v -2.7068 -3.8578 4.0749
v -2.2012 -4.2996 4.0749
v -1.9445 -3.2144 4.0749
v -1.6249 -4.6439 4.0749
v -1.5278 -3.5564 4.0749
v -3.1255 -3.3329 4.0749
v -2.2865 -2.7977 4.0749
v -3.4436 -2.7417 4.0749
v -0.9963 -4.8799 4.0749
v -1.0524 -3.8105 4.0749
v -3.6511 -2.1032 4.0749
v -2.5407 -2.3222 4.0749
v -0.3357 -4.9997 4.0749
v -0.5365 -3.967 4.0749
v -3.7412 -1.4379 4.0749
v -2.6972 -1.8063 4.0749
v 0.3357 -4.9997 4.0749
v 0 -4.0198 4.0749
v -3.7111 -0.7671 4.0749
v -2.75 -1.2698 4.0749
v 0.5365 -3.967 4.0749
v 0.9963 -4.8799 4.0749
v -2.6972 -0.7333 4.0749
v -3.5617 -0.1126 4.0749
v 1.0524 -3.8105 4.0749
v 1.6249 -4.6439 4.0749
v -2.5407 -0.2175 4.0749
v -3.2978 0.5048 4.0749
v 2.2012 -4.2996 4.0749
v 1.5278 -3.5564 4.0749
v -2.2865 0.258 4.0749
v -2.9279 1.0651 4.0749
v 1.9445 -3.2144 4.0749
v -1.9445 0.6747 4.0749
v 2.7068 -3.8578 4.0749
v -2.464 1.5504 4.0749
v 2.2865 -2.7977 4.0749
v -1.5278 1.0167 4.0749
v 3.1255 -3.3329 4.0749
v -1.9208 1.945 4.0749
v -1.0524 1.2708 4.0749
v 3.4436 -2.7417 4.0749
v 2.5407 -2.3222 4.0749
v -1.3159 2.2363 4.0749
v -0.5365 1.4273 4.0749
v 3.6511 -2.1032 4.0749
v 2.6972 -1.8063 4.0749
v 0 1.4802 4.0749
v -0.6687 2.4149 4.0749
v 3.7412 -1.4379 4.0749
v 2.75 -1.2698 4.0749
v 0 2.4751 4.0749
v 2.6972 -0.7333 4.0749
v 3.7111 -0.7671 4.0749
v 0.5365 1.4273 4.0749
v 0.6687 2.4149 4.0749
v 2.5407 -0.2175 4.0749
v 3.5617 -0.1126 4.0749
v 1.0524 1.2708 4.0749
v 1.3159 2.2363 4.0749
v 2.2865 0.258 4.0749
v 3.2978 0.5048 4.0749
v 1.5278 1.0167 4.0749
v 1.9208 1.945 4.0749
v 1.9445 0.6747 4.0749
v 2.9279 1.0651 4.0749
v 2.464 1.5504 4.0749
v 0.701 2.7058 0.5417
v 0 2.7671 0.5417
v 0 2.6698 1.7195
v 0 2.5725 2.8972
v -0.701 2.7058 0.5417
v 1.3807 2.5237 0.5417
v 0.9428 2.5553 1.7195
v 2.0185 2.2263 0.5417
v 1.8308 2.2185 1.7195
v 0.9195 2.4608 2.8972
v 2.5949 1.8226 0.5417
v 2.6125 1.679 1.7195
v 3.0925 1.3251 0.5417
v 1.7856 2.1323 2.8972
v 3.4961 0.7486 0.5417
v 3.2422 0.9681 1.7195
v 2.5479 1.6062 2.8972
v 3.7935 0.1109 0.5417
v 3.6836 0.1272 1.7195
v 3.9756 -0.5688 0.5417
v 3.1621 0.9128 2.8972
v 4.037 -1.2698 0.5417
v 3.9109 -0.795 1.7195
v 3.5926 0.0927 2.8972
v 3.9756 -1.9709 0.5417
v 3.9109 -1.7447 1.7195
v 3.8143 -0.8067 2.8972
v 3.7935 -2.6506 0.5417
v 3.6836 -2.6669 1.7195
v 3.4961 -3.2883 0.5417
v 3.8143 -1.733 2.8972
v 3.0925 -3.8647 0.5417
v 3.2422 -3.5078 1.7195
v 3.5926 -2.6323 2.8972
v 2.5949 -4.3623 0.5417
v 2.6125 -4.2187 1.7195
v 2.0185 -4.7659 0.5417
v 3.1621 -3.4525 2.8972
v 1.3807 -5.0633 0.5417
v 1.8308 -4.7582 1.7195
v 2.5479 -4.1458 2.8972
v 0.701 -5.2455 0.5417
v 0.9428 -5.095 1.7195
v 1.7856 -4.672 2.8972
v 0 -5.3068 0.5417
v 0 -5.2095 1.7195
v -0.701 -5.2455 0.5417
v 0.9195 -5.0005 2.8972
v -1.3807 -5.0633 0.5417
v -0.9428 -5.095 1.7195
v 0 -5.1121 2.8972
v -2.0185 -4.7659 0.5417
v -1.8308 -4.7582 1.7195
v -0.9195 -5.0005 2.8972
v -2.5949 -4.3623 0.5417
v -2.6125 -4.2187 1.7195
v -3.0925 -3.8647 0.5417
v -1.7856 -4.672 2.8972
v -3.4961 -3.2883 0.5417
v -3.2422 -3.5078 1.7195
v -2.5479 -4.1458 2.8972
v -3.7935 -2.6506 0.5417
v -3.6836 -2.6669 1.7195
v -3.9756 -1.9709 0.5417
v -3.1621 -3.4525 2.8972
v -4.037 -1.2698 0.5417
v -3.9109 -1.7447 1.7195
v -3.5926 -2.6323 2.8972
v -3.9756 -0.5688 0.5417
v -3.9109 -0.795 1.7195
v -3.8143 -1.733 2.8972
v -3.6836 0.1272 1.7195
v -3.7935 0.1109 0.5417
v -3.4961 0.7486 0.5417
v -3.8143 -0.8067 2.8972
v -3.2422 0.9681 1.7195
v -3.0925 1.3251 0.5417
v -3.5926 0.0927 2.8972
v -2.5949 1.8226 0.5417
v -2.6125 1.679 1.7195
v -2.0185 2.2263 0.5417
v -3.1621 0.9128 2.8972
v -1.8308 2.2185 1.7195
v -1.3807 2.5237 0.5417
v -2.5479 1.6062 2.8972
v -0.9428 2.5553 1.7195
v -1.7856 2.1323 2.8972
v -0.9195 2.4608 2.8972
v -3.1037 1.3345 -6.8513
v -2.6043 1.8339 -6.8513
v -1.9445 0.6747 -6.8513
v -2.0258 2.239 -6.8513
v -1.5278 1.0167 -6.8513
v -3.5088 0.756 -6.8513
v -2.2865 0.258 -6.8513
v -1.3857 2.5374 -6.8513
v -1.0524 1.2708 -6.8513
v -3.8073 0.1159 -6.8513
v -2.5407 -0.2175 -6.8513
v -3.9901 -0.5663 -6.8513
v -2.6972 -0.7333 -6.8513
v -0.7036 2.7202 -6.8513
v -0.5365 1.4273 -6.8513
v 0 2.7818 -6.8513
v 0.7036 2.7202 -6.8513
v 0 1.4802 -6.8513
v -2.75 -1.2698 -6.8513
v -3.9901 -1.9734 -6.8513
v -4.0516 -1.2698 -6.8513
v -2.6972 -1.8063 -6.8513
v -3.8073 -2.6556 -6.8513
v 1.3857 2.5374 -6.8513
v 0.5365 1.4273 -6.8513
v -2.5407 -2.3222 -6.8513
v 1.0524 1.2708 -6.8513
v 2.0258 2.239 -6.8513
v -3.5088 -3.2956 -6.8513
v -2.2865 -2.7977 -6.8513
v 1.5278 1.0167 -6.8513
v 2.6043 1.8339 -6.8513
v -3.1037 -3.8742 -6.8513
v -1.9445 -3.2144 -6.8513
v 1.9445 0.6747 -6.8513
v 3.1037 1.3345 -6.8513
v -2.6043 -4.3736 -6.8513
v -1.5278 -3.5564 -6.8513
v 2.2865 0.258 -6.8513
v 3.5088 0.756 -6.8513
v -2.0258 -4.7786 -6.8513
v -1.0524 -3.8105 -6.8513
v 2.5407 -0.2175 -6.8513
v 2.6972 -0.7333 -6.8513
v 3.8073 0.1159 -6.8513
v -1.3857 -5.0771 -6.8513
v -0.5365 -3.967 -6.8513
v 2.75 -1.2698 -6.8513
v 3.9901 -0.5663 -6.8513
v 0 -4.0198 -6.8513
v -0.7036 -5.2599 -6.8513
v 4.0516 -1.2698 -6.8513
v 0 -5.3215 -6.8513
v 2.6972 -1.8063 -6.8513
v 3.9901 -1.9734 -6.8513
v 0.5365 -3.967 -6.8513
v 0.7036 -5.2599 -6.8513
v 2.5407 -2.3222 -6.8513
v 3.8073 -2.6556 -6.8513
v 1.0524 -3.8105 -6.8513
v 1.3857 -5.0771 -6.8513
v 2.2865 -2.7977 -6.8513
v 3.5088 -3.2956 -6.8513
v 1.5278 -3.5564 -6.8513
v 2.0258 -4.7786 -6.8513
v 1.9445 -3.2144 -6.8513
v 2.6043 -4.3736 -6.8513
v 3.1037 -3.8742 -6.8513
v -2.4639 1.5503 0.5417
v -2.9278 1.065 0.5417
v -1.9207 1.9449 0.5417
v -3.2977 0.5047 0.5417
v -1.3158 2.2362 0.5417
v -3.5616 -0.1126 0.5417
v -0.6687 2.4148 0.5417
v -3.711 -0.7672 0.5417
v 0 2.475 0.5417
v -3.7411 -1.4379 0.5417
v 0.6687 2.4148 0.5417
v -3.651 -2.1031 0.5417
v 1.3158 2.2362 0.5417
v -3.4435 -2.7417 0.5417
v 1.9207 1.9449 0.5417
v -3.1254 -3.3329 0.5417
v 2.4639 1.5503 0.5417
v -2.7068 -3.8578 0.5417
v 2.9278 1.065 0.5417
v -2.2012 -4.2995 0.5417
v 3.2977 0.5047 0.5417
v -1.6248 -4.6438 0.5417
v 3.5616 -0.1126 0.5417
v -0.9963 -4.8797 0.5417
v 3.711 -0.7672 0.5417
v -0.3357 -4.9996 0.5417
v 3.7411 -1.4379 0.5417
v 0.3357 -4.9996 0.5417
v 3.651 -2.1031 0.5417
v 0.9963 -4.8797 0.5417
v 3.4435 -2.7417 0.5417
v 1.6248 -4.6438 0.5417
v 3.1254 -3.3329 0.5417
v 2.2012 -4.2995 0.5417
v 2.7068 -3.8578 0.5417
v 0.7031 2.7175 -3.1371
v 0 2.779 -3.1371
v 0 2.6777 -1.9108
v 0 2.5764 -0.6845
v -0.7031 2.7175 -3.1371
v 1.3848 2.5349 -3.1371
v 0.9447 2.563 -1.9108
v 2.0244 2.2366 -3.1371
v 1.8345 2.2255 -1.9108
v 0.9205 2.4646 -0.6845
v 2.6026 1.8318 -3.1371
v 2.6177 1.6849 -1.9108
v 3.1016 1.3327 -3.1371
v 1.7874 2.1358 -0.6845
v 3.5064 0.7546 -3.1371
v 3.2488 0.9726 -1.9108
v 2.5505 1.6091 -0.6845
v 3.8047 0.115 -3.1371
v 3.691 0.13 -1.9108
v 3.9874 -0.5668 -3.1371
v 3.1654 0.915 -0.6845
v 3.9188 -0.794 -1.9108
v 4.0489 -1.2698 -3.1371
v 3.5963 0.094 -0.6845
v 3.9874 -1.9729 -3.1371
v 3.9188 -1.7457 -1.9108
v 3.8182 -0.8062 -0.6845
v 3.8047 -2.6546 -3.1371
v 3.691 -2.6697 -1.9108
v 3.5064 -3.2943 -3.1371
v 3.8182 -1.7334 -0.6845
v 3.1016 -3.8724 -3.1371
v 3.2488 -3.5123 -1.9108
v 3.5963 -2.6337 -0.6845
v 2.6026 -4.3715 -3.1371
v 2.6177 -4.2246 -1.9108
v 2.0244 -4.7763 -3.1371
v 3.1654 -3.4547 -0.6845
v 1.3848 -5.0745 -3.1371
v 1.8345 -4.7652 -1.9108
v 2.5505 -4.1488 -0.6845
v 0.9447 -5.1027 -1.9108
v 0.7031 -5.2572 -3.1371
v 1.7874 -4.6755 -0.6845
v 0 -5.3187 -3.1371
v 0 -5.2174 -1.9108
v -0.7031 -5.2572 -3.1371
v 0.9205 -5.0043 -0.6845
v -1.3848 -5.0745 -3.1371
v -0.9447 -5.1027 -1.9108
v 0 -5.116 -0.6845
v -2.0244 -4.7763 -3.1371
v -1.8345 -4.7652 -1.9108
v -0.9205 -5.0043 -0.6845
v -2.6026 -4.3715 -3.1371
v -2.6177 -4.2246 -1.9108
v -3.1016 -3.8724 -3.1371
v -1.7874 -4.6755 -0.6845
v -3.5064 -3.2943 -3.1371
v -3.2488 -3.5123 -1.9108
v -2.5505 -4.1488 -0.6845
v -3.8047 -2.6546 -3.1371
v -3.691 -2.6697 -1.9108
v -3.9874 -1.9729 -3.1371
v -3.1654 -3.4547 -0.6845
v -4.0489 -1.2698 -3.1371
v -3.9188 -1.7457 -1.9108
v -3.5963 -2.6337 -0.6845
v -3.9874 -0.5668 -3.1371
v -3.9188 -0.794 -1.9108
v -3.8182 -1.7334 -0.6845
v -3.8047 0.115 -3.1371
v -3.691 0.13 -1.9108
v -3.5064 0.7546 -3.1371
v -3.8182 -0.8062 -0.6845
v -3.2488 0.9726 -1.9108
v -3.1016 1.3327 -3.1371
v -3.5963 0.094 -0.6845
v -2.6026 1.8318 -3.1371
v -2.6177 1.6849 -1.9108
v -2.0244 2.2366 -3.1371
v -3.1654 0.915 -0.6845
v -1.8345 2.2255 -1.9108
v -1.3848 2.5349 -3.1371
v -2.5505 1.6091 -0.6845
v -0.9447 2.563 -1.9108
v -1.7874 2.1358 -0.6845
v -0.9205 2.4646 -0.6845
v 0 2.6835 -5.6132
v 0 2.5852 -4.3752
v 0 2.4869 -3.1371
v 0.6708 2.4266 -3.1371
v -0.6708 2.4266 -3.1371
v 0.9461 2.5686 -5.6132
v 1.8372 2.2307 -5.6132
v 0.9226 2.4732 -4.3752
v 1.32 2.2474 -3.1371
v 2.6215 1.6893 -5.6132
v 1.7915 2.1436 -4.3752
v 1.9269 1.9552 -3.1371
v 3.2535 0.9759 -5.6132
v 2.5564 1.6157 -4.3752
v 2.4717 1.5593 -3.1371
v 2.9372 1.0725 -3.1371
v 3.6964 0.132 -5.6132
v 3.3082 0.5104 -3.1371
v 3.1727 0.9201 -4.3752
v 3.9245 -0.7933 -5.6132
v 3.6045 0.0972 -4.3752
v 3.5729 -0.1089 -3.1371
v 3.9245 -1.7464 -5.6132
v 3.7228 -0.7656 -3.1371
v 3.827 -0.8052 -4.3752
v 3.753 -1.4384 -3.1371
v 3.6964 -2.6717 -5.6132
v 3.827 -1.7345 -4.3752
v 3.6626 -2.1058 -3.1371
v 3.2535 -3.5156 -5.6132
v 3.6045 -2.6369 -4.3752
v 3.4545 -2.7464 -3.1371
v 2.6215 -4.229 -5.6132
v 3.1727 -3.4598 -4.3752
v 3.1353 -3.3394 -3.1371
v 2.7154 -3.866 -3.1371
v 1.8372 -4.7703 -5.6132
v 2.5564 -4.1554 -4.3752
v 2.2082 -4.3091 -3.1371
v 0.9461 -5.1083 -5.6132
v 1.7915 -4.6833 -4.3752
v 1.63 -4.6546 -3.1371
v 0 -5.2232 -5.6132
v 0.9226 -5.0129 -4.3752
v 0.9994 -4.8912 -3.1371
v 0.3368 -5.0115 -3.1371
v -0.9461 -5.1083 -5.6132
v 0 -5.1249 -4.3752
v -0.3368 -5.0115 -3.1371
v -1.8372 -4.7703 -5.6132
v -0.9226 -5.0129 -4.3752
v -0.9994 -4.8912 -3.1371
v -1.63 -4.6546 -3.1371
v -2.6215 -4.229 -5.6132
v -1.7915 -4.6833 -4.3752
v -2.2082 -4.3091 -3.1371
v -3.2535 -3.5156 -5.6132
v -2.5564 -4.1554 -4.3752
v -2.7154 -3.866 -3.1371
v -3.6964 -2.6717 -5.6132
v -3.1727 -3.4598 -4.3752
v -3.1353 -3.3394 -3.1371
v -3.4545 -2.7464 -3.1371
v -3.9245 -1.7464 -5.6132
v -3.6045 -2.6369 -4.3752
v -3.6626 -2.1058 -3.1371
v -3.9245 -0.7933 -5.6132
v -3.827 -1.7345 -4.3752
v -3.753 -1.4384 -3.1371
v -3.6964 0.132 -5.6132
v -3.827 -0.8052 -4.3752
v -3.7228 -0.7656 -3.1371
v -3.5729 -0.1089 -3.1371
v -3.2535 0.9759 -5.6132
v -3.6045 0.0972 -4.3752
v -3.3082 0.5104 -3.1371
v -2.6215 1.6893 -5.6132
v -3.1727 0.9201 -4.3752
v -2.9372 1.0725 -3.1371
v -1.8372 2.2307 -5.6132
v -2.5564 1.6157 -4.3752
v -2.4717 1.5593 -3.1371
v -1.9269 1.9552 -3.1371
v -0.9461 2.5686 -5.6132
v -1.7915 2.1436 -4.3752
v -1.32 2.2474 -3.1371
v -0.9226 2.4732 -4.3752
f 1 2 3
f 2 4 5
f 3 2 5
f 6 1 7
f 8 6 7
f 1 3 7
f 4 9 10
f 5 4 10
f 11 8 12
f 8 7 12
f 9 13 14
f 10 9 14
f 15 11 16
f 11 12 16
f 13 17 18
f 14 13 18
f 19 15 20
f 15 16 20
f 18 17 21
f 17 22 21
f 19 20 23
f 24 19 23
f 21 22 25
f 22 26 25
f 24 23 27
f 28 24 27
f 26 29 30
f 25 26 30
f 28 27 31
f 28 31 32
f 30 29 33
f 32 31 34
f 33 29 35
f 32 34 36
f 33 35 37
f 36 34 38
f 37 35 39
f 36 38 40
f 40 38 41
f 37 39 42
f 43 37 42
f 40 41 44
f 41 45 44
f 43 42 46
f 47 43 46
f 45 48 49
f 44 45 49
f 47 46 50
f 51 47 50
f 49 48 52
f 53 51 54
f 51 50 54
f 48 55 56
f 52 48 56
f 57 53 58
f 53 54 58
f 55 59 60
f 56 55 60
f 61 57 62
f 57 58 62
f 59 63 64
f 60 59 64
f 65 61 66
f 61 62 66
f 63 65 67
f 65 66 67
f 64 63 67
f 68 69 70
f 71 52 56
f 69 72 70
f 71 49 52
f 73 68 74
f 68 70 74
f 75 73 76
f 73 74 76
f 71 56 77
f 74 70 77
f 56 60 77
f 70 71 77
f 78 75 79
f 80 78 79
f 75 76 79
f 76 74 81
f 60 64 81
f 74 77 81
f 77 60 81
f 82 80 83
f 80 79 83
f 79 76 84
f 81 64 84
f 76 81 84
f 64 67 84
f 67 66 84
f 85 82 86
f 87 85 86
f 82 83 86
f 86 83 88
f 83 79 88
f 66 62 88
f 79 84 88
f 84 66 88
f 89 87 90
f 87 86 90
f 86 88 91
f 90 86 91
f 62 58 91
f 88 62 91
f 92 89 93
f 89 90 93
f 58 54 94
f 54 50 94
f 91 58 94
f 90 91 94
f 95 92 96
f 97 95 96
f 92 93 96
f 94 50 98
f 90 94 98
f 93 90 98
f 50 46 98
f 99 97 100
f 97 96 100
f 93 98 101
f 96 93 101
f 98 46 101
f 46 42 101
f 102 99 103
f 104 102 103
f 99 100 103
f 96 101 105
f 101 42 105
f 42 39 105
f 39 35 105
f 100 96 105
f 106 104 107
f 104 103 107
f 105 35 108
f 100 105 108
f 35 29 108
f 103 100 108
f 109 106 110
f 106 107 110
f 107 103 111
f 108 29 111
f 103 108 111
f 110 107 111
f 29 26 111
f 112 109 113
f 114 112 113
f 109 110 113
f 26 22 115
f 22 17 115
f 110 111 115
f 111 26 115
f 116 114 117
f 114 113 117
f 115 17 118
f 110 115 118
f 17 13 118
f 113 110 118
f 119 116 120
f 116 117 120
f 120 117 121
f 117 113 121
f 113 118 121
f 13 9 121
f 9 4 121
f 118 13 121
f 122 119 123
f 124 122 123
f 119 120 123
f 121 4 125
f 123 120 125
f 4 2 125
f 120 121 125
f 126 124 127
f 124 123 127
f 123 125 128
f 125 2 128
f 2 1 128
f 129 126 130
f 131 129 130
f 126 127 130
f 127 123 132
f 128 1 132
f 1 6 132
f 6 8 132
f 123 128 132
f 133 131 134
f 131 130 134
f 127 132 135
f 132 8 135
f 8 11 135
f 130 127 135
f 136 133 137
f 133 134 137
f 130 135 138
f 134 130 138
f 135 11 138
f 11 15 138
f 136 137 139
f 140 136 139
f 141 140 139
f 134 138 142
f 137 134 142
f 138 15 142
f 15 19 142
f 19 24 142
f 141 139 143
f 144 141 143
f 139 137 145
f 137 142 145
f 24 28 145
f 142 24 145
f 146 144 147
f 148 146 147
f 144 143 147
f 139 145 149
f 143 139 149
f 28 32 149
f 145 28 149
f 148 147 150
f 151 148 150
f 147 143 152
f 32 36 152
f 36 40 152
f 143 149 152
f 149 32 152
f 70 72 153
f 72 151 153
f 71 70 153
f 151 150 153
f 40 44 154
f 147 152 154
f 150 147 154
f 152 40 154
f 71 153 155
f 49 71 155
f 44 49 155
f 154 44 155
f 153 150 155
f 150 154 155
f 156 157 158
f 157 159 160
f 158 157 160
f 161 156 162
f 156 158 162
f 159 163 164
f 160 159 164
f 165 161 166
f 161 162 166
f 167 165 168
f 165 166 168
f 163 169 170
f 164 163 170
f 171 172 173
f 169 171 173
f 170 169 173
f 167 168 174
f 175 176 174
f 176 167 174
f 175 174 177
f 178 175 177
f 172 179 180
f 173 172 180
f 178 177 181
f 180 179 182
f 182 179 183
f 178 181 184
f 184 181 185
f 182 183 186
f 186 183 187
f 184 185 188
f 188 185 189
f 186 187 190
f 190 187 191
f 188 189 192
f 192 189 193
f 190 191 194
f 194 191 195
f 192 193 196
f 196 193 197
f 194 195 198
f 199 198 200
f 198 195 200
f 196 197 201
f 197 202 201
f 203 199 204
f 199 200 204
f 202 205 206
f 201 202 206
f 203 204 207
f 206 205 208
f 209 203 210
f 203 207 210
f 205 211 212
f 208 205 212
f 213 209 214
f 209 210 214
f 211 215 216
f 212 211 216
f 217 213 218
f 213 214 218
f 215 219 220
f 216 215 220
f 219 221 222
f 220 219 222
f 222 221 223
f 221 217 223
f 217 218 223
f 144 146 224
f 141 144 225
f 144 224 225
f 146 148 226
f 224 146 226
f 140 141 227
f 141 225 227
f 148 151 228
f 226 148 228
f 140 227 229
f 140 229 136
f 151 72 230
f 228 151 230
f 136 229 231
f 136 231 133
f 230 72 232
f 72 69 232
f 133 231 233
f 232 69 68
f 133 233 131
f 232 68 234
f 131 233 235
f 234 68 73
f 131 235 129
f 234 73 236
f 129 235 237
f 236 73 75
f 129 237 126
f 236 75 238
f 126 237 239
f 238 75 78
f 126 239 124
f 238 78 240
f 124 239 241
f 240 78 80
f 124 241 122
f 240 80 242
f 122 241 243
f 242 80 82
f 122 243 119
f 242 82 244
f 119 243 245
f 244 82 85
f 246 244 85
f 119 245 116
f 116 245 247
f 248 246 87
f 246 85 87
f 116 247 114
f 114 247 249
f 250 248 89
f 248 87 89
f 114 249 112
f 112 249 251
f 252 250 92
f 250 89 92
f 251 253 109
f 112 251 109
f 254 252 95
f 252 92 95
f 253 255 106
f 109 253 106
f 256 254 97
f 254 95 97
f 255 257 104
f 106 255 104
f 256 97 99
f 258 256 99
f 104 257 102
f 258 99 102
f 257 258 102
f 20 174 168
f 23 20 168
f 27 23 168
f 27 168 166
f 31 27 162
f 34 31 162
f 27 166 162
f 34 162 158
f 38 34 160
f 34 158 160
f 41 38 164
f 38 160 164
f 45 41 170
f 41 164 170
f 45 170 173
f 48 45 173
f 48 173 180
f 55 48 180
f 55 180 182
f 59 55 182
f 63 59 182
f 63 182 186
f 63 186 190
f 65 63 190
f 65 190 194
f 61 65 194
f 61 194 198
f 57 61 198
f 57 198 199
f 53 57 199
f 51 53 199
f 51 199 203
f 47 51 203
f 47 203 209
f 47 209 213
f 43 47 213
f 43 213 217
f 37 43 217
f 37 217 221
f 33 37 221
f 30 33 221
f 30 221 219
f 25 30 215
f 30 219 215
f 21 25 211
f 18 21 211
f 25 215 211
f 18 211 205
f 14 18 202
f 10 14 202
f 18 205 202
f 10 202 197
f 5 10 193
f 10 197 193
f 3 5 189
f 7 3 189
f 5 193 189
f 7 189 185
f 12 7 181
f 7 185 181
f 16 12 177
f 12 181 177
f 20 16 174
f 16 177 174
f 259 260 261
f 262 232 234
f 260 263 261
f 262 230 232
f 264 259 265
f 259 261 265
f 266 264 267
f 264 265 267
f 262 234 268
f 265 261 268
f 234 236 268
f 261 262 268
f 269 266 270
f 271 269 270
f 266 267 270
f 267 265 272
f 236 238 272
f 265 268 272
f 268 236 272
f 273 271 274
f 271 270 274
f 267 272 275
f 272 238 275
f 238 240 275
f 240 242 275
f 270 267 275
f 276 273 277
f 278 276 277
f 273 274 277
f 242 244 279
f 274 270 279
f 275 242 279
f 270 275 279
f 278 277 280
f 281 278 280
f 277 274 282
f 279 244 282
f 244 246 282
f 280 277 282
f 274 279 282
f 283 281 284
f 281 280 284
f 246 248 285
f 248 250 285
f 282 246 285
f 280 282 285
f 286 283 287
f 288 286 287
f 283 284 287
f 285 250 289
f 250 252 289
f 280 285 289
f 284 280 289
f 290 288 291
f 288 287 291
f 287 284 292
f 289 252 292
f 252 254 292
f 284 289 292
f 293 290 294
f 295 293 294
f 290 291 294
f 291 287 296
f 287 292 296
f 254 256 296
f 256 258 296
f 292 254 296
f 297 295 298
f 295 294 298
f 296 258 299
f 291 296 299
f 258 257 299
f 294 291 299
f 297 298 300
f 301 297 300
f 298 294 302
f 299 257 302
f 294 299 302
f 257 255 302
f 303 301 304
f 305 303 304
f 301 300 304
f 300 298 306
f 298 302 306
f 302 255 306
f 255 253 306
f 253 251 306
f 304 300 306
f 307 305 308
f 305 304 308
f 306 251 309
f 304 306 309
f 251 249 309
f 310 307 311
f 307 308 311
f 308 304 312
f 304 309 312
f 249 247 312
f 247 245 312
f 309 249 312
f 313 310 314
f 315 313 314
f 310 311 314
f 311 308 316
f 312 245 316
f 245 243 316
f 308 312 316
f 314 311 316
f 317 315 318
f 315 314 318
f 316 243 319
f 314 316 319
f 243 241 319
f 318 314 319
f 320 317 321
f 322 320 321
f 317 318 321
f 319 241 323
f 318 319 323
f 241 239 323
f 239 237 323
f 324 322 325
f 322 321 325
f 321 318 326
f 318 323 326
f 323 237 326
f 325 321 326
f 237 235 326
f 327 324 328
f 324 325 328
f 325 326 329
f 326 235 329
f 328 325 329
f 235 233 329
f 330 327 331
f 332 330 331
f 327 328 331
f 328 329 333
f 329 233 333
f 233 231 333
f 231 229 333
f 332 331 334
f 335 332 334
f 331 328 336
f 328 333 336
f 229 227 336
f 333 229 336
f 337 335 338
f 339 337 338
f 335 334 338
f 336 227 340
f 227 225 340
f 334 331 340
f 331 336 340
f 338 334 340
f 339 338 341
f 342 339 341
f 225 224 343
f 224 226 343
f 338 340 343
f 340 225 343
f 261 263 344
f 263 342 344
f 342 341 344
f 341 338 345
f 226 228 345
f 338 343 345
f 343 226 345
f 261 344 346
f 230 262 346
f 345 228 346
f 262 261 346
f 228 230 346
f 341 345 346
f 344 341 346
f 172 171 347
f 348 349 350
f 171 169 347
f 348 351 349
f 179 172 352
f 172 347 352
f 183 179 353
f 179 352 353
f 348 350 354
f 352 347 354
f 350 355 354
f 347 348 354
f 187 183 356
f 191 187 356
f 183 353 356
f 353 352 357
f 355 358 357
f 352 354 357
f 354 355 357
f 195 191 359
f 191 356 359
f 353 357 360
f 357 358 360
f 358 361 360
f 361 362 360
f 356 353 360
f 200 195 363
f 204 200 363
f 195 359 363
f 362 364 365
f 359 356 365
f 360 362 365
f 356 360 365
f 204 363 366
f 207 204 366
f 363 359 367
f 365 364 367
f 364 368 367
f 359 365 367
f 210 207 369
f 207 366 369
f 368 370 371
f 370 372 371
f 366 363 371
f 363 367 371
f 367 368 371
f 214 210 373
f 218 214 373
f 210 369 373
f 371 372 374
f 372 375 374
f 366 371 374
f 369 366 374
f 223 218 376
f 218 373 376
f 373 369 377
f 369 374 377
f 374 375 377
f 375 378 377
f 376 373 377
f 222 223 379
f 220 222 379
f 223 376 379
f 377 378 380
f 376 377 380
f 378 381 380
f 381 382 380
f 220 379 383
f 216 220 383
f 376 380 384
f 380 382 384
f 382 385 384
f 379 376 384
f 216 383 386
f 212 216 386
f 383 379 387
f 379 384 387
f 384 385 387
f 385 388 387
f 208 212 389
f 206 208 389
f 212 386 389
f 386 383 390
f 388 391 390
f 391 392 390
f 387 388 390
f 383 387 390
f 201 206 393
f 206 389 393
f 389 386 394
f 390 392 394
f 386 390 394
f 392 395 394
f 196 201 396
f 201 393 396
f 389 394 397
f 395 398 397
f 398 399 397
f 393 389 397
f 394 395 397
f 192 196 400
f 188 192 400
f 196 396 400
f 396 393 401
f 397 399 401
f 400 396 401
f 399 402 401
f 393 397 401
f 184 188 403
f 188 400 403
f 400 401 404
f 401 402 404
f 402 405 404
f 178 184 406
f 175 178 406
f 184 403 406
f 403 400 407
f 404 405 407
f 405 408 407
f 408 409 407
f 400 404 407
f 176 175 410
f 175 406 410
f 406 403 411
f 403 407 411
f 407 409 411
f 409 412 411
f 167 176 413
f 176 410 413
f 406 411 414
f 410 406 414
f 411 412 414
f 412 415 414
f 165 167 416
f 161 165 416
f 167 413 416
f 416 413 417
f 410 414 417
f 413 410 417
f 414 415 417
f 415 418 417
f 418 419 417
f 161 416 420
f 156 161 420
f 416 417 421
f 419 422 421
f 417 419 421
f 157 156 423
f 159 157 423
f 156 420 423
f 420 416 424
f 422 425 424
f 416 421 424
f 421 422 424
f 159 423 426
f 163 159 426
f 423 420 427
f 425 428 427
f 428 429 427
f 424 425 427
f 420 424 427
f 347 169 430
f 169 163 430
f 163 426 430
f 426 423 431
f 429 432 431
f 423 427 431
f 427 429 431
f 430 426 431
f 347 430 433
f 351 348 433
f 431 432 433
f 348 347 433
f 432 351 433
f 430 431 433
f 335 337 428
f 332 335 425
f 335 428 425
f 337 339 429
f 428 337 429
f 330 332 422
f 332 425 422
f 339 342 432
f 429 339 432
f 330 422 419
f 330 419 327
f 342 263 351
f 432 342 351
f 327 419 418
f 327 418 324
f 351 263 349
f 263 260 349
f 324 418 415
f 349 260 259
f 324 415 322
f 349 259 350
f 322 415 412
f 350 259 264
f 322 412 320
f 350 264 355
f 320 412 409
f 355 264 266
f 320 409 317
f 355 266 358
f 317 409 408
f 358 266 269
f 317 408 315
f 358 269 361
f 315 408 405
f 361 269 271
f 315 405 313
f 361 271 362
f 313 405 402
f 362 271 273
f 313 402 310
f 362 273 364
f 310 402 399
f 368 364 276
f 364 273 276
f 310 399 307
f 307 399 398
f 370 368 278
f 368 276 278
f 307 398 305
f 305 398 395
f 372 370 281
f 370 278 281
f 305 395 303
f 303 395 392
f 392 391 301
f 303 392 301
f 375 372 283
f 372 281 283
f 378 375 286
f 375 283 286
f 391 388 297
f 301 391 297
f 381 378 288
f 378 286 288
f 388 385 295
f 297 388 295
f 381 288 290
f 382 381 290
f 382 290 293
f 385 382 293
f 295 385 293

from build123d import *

# Parameters (mm, degrees)
SKETCH7_R          = 2.75
CUT_EXTRUDE3_DEPTH = 11.926156548


with BuildPart() as part:
    # Sketch2 → Revolve2 (revolve)
    with BuildSketch(Plane(origin=(0, 0, 0), x_dir=(0, 0, -1), z_dir=(1, 0, 0))):
        Polygon((-0.541748287, -1.269840707), (6.851295576, -1.269840707), (6.851295576, 1.28177138), (6.851295576, 2.78177138), (3.137110203, 2.486943896), (3.137110203, 1.279043896), (3.137110203, 2.779043896), (-0.541748287, 2.475013223), (-0.541748287, 1.267113223), (-0.541748287, 2.767113223), (-4.074860971, 2.475127372), (-4.074860971, 0.975127372), (-4.074860971, -1.269840707), align=None)
    revolve(axis=Axis((0, -1.269840707, 0.541748287), (0, 0, -1)))

    # Sketch7 → Cut-Extrude3 (cut, through all)
    with BuildSketch(Plane(origin=(0, 0, -6.851295576), x_dir=(-1, 0, 0), z_dir=(0, 0, -1))):
        with Locations((0, -1.269840707)):
            Circle(SKETCH7_R)
    extrude(amount=-CUT_EXTRUDE3_DEPTH, mode=Mode.SUBTRACT)


solid = part.part
